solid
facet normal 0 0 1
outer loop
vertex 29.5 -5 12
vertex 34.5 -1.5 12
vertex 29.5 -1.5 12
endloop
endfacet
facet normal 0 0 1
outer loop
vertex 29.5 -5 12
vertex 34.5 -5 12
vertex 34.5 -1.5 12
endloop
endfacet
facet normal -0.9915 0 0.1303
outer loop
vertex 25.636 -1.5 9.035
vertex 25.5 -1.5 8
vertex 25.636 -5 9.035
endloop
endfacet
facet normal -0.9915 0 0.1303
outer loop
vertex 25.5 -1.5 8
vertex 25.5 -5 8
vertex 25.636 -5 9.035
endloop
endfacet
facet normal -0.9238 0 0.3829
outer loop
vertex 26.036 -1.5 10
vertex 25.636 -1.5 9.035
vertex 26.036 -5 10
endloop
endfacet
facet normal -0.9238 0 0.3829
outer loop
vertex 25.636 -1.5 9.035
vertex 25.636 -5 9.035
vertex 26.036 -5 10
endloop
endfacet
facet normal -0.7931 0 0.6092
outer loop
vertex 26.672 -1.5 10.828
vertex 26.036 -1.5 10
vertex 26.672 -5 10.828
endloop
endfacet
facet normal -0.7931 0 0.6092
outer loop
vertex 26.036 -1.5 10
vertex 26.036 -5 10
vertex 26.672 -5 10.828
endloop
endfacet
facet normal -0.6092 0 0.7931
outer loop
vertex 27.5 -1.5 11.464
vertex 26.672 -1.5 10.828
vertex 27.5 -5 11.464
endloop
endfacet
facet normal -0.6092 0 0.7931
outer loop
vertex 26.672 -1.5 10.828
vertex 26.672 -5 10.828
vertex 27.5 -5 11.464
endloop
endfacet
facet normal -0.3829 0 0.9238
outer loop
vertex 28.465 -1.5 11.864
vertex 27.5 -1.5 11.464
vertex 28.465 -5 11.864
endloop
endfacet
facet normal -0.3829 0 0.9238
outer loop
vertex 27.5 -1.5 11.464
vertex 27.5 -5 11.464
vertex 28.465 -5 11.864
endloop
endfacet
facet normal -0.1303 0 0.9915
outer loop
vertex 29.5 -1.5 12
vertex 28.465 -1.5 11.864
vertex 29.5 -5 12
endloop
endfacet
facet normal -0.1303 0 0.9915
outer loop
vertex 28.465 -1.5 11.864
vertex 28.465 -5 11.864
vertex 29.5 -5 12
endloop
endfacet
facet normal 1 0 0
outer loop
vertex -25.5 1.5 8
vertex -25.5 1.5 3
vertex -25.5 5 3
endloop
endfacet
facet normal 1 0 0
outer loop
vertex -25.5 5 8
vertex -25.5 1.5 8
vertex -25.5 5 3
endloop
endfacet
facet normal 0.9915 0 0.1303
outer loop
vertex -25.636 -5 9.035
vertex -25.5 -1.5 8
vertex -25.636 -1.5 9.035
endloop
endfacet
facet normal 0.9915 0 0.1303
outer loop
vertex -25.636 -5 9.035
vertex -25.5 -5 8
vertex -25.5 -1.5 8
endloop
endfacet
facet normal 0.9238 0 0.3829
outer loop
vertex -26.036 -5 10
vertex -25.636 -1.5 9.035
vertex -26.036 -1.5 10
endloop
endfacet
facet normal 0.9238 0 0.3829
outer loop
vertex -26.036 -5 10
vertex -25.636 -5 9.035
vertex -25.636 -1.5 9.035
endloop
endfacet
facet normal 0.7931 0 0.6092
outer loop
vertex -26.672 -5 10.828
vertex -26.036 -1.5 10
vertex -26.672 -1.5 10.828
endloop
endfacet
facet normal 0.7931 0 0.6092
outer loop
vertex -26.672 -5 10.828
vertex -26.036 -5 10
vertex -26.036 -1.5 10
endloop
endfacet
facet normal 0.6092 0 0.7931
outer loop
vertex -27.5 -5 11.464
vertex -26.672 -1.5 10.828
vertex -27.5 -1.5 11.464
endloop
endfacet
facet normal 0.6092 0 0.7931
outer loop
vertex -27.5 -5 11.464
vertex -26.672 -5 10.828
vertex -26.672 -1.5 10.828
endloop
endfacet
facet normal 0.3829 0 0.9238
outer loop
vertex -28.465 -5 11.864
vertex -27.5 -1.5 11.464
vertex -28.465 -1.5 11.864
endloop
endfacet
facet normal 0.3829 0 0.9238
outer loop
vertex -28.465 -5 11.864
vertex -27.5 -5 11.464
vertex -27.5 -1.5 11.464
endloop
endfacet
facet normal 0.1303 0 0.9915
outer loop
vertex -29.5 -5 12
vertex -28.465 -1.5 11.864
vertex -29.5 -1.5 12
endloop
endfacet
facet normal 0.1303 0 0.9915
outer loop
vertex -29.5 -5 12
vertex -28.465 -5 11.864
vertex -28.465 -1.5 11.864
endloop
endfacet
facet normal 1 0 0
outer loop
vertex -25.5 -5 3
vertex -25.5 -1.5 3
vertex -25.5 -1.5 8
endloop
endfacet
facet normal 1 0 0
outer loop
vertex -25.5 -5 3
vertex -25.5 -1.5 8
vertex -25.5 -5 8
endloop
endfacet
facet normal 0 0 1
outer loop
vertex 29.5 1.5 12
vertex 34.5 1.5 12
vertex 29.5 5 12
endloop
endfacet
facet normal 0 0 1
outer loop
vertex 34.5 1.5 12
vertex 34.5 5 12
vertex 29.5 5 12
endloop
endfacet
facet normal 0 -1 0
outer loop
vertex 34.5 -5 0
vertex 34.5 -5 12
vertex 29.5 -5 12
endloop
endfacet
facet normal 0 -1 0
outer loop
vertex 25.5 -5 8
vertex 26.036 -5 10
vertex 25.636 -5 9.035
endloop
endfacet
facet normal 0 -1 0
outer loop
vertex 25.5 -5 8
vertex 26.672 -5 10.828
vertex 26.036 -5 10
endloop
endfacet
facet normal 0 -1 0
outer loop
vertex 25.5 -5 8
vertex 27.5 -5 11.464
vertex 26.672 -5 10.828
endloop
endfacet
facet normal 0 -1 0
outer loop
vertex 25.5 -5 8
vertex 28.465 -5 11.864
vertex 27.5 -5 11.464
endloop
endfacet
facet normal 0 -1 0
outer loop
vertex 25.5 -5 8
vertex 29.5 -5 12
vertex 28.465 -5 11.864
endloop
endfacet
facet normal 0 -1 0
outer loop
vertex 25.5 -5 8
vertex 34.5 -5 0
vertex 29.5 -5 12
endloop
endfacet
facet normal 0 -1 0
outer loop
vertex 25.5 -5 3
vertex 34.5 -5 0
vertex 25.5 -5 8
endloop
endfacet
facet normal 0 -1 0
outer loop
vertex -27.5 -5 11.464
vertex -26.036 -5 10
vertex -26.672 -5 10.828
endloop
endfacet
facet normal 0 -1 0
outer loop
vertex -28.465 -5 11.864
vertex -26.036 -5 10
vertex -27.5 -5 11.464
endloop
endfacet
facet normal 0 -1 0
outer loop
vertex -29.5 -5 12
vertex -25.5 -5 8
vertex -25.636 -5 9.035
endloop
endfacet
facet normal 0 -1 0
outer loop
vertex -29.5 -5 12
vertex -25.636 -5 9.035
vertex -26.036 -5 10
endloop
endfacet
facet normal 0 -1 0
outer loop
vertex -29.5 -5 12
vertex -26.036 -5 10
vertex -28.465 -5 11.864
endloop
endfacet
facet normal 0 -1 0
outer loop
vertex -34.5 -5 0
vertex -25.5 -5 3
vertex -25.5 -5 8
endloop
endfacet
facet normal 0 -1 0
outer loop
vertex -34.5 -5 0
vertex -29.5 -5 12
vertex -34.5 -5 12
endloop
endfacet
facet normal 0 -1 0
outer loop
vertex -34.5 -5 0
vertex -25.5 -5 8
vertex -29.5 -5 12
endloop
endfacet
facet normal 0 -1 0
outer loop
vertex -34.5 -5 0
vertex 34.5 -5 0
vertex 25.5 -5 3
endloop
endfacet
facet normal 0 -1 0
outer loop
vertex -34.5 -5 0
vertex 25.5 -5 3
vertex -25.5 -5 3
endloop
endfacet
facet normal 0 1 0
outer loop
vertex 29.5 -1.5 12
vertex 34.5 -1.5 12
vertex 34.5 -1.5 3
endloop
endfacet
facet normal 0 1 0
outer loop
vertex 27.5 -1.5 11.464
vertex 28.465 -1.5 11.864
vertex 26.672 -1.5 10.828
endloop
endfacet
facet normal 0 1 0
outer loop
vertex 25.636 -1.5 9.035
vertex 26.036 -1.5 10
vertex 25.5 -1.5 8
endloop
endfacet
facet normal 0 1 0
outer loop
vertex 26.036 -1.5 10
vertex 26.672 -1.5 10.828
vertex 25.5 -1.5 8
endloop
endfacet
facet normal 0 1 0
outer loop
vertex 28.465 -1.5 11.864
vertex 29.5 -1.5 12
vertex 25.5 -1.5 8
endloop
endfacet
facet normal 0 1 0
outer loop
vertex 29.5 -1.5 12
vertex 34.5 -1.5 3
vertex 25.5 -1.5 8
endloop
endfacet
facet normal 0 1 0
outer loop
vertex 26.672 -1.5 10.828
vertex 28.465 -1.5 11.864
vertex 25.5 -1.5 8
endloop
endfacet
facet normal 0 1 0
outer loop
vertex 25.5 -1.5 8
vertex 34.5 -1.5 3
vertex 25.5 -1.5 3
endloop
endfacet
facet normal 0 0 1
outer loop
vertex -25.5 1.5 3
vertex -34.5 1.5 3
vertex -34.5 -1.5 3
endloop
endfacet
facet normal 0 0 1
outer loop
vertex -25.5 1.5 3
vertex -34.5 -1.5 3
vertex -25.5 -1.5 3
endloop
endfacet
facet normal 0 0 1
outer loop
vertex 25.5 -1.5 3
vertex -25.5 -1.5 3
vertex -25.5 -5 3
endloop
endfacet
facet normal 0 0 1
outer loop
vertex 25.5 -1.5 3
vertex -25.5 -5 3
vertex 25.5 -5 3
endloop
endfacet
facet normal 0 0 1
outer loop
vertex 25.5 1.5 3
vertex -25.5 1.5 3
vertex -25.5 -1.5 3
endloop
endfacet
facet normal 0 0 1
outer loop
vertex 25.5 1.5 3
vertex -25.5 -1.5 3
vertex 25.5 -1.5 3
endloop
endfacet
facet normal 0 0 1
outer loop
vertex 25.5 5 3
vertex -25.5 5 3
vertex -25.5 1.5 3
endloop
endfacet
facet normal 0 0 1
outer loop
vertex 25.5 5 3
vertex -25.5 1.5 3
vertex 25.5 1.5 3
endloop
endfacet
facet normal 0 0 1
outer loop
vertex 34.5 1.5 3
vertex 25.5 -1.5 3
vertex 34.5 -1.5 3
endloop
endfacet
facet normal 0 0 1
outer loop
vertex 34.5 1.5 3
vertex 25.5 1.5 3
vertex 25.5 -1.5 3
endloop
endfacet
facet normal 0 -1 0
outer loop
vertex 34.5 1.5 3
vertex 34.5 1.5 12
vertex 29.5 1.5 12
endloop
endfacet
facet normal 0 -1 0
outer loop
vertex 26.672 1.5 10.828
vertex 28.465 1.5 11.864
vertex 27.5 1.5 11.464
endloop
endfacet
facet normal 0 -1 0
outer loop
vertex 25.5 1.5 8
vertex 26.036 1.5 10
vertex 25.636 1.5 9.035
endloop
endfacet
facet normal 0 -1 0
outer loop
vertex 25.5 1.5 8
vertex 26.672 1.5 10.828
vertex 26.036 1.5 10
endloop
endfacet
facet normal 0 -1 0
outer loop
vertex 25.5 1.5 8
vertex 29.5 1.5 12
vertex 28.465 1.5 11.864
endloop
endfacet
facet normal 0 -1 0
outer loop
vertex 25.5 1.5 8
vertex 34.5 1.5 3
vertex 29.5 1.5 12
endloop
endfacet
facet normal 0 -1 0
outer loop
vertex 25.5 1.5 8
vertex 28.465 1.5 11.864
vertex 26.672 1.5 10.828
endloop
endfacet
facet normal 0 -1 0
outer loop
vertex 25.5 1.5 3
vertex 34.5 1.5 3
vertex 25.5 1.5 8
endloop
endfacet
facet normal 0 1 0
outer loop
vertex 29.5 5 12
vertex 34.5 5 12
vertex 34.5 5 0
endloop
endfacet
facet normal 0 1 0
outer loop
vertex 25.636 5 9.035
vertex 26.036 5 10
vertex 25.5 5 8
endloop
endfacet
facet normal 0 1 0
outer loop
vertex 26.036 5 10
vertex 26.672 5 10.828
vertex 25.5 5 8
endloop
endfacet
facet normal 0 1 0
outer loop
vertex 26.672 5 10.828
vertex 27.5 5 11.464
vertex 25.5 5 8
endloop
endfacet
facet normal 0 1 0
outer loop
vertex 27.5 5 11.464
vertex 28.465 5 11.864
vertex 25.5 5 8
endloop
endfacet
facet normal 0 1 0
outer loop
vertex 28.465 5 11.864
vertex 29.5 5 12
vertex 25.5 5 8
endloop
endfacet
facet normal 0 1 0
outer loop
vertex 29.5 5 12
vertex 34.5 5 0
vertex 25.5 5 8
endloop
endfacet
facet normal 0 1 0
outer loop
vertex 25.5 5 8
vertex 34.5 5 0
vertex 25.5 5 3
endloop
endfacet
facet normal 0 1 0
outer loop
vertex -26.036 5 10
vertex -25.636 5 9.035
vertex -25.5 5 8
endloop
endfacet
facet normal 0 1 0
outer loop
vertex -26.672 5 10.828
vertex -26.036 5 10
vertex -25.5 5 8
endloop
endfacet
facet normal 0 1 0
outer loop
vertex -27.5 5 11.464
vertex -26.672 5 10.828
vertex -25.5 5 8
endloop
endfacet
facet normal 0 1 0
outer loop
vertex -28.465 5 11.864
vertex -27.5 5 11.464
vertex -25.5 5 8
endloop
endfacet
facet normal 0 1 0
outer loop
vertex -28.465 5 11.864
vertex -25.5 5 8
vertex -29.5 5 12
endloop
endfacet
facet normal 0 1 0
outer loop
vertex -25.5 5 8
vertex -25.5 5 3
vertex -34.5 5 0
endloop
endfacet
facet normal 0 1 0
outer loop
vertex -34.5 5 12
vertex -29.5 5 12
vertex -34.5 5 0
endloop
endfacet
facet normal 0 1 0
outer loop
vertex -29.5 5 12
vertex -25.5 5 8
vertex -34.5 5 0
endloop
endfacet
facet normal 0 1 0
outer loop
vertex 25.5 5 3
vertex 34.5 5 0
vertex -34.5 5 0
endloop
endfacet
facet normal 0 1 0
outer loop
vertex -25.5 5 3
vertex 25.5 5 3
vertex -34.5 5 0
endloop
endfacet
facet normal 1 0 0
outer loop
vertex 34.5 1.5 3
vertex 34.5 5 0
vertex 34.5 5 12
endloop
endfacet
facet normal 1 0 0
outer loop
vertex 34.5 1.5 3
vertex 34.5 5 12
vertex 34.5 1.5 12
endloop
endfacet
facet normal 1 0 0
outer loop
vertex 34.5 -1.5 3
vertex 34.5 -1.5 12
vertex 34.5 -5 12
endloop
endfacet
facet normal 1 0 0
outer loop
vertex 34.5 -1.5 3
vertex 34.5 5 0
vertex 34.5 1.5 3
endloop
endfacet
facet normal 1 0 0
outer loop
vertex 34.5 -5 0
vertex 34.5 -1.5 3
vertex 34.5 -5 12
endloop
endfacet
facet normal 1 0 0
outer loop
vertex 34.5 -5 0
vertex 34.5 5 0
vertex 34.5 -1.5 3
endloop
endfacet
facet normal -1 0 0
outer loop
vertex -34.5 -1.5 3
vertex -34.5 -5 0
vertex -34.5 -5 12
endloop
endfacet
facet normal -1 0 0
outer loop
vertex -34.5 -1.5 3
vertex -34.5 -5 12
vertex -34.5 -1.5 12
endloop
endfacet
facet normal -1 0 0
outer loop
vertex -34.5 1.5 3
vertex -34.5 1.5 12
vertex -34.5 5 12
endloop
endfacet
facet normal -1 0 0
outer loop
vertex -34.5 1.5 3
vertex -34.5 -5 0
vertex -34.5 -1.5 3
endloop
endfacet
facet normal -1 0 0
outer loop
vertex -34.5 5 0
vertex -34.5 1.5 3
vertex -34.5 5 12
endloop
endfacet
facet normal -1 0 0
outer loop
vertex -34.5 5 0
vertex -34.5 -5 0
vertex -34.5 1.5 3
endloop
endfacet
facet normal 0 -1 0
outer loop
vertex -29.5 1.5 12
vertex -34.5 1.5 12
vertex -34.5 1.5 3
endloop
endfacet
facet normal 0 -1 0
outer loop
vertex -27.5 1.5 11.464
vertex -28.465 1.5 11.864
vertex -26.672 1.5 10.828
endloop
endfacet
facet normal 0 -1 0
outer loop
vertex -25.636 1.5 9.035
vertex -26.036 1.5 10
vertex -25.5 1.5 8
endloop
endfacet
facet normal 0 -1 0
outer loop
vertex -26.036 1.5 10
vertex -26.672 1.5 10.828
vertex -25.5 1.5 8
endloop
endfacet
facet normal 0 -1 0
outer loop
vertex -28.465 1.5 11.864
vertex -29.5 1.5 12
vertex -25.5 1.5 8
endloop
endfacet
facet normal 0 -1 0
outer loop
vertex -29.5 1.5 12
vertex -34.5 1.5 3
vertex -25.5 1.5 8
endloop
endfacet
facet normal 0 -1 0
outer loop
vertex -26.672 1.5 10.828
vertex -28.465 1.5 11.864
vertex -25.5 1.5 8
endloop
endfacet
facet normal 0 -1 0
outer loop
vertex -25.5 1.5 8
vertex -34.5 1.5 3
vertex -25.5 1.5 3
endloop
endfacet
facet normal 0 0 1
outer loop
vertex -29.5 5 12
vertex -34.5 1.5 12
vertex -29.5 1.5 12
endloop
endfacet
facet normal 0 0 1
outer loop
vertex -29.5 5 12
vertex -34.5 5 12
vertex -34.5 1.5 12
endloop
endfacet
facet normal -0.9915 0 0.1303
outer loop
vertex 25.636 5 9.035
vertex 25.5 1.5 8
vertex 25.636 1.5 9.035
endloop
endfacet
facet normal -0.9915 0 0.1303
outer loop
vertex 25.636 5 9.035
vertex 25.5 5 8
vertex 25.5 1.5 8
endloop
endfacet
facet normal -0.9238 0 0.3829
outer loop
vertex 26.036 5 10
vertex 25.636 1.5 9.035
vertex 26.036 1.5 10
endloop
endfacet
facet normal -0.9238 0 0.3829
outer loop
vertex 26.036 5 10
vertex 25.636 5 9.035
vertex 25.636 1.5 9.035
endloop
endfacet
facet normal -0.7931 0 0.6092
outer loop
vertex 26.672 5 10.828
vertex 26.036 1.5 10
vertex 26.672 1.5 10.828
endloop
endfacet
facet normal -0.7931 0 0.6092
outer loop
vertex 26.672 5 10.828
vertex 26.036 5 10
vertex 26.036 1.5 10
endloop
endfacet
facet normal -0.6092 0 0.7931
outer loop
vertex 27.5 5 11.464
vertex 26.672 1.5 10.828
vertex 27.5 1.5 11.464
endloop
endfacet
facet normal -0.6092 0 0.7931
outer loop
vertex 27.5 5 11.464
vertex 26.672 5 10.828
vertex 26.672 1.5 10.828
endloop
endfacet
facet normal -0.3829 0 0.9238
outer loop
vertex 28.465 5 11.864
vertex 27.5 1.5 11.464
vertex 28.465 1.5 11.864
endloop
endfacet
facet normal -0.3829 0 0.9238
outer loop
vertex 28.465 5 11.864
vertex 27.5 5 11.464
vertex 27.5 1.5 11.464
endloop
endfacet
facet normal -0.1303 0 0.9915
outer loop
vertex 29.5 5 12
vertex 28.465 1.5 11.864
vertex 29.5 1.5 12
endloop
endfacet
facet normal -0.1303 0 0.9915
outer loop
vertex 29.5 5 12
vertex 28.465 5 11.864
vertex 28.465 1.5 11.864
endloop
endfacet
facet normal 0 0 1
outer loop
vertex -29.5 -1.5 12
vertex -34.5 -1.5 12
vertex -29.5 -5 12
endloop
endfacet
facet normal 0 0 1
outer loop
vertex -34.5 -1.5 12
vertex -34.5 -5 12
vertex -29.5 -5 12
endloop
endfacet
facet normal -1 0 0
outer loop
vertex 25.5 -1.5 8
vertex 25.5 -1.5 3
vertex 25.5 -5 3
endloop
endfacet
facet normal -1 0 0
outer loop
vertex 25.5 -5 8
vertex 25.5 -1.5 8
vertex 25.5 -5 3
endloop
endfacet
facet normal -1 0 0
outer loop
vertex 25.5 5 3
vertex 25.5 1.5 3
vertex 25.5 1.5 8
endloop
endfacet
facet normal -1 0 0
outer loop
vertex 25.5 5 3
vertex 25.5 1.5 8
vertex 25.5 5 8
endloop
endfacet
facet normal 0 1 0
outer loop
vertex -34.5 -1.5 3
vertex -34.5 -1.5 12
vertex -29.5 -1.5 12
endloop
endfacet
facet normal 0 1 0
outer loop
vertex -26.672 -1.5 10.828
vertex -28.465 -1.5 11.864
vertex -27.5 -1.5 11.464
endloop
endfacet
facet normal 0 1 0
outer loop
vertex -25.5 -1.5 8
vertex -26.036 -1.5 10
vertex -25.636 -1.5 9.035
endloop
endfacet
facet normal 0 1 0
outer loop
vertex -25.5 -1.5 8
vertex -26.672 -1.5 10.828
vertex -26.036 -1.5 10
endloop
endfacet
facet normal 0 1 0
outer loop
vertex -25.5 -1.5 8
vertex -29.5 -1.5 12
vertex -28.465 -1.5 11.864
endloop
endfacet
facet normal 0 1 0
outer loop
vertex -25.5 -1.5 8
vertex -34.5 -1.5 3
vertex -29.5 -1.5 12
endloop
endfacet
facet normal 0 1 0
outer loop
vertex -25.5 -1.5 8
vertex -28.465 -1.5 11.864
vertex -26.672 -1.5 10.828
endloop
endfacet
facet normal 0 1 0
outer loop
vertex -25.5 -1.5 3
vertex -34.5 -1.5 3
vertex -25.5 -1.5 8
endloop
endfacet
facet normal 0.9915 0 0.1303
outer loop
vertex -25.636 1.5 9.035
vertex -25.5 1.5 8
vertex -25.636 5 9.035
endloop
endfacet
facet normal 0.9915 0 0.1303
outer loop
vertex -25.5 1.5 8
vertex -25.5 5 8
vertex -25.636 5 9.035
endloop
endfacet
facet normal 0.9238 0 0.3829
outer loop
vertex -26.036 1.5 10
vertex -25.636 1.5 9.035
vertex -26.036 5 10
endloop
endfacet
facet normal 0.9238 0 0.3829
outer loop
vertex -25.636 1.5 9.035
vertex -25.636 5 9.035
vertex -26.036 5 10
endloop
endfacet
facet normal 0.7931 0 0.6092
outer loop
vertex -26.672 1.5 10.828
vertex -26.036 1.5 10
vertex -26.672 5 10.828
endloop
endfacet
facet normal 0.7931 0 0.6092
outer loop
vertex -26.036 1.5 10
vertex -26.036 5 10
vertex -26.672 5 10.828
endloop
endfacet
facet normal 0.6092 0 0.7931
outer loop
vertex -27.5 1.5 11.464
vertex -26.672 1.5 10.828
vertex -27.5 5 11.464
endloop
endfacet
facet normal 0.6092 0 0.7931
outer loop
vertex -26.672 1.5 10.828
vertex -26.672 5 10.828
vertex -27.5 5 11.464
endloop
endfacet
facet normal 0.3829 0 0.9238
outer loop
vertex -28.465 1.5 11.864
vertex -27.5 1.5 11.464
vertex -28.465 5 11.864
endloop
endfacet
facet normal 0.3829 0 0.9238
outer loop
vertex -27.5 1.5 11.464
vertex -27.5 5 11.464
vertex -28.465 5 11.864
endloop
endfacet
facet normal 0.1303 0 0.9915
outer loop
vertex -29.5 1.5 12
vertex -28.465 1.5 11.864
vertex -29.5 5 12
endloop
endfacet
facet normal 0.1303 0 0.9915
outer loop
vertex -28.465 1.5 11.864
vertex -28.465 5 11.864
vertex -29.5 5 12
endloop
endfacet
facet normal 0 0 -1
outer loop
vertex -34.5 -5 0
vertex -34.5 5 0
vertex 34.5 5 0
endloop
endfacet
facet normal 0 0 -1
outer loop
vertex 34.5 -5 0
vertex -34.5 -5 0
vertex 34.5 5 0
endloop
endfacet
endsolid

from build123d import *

# Parameters (mm, degrees)
F2_W     = 69
F2_H     = 10
F3_DEPTH = 3
F4_W     = 9
F4_H     = 3.5
F5_DEPTH = 9
F6_R     = 4


with BuildPart() as f3:
    # F2 (on Top) → F3 (new body)
    with BuildSketch(Plane.XY):
        Rectangle(F2_W, F2_H)
    extrude(amount=F3_DEPTH)

    # F4 (on face) → F5 (join)
    with BuildSketch(Plane.XY.offset(3)):
        with Locations((-30, 3.25)):
            Rectangle(F4_W, F4_H)
    extrude(amount=F5_DEPTH)

    # F6
    f6_edges = [f3.edges().sort_by_distance(p)[0] for p in [
        (-25.5, 3.25, 12),
    ]]
    fillet(f6_edges, radius=F6_R)

    # F7: F3 across plane


with BuildPart() as f3_1:
    add(f3.part)
    add(f3.part.mirror(Plane.YZ))

    # F8: F3 across plane


with BuildPart() as f3_2:
    add(f3_1.part)
    add(f3_1.part.mirror(Plane.XZ))


solid = f3_2.part
